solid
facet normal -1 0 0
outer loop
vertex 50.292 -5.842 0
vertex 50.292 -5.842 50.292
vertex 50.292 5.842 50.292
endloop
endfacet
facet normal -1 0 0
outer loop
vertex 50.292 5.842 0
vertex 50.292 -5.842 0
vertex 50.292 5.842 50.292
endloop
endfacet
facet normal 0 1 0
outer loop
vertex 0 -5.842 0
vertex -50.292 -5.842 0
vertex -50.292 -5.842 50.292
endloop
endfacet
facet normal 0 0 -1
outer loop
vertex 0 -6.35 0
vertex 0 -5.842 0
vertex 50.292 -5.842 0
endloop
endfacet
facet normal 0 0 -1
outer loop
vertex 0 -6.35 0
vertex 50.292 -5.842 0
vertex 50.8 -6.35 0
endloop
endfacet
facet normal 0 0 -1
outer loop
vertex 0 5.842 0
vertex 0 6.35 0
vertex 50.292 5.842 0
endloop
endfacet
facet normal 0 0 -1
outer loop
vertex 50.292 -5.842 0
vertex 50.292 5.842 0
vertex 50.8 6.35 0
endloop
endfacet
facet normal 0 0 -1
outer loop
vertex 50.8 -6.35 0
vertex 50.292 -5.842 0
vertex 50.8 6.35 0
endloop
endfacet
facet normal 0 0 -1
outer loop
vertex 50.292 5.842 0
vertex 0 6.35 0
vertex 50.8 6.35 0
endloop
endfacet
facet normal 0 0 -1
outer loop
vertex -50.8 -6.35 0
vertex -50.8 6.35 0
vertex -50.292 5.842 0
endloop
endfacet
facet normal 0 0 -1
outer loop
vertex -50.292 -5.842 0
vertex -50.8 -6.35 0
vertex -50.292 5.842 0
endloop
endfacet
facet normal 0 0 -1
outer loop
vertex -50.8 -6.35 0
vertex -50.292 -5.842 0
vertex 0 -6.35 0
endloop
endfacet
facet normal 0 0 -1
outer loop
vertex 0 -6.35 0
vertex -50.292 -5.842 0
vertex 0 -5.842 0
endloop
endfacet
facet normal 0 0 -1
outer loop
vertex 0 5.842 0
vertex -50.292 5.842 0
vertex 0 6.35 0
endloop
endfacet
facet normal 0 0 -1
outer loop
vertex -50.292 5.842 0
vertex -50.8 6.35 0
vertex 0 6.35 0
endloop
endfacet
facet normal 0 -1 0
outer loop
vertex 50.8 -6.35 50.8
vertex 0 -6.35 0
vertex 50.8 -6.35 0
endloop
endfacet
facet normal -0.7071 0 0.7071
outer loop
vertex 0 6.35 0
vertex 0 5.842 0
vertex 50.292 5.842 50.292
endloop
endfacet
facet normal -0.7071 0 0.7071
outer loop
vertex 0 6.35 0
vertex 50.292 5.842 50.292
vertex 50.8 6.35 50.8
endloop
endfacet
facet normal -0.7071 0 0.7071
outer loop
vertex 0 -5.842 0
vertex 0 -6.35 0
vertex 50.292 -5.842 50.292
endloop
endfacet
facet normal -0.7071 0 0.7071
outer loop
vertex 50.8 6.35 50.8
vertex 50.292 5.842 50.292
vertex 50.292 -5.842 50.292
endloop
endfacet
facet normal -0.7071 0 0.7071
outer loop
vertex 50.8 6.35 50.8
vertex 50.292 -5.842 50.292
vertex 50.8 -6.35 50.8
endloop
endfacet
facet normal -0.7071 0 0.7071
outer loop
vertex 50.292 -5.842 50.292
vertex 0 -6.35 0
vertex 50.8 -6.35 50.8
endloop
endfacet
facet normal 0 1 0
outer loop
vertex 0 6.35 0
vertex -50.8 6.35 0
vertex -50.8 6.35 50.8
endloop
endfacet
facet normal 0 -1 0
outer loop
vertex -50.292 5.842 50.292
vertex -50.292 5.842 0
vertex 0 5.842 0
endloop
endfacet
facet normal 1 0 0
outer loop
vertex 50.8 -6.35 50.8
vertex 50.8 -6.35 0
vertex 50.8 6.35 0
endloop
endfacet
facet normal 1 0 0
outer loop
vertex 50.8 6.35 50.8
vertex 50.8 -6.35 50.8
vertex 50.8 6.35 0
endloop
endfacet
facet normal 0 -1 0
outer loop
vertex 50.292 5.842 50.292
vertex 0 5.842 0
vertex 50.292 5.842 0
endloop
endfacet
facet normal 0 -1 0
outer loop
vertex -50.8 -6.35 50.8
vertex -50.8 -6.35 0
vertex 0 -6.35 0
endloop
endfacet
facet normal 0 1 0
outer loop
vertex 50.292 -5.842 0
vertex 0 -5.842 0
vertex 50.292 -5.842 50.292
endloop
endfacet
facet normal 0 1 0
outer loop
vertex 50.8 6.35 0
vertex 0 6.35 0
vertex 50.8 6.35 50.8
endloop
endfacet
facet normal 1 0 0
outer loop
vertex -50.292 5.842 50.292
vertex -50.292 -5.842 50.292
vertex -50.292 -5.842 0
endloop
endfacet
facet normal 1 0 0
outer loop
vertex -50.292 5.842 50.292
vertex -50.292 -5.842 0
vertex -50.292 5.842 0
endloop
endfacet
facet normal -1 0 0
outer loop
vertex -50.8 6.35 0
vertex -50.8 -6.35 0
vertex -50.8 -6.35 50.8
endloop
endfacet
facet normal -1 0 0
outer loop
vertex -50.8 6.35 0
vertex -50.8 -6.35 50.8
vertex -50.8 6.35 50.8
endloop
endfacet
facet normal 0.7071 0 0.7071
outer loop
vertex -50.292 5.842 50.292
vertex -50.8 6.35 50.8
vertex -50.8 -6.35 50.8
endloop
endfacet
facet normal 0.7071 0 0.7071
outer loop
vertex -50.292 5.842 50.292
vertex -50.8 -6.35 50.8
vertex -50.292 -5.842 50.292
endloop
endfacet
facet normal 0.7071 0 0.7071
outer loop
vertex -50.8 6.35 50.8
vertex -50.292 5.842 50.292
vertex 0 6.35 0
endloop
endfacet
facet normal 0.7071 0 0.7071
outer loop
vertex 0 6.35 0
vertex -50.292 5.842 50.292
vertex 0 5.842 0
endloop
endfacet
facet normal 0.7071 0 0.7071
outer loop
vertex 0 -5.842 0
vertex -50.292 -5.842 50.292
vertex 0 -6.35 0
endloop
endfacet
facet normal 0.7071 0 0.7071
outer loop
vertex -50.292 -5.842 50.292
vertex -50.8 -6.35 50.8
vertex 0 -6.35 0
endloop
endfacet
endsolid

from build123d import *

# Parameters (mm, degrees)
F0_W     = 101.6
F0_H     = 12.7
F1_DEPTH = 50.8
F2_T     = -0.508
F4_DEPTH = 13.208


with BuildPart() as f1:
    # F0 (on Top) → F1 (new body)
    with BuildSketch(Plane.XY):
        Rectangle(F0_W, F0_H)
    extrude(amount=F1_DEPTH)

    # F2
    f2_openings = [f1.faces().sort_by_distance(p)[0] for p in [
        (0, 0, 50.8),
        (0, 0, 0),
    ]]
    offset(amount=F2_T, openings=f2_openings)

    # F3 (on face) → F4 (cut)
    with BuildSketch(Plane.XZ.offset(6.35)):
        Polygon((-50.8, 50.8), (0, 0), (50.8, 50.8), align=None)
    extrude(amount=-F4_DEPTH, mode=Mode.SUBTRACT)


solid = f1.part
